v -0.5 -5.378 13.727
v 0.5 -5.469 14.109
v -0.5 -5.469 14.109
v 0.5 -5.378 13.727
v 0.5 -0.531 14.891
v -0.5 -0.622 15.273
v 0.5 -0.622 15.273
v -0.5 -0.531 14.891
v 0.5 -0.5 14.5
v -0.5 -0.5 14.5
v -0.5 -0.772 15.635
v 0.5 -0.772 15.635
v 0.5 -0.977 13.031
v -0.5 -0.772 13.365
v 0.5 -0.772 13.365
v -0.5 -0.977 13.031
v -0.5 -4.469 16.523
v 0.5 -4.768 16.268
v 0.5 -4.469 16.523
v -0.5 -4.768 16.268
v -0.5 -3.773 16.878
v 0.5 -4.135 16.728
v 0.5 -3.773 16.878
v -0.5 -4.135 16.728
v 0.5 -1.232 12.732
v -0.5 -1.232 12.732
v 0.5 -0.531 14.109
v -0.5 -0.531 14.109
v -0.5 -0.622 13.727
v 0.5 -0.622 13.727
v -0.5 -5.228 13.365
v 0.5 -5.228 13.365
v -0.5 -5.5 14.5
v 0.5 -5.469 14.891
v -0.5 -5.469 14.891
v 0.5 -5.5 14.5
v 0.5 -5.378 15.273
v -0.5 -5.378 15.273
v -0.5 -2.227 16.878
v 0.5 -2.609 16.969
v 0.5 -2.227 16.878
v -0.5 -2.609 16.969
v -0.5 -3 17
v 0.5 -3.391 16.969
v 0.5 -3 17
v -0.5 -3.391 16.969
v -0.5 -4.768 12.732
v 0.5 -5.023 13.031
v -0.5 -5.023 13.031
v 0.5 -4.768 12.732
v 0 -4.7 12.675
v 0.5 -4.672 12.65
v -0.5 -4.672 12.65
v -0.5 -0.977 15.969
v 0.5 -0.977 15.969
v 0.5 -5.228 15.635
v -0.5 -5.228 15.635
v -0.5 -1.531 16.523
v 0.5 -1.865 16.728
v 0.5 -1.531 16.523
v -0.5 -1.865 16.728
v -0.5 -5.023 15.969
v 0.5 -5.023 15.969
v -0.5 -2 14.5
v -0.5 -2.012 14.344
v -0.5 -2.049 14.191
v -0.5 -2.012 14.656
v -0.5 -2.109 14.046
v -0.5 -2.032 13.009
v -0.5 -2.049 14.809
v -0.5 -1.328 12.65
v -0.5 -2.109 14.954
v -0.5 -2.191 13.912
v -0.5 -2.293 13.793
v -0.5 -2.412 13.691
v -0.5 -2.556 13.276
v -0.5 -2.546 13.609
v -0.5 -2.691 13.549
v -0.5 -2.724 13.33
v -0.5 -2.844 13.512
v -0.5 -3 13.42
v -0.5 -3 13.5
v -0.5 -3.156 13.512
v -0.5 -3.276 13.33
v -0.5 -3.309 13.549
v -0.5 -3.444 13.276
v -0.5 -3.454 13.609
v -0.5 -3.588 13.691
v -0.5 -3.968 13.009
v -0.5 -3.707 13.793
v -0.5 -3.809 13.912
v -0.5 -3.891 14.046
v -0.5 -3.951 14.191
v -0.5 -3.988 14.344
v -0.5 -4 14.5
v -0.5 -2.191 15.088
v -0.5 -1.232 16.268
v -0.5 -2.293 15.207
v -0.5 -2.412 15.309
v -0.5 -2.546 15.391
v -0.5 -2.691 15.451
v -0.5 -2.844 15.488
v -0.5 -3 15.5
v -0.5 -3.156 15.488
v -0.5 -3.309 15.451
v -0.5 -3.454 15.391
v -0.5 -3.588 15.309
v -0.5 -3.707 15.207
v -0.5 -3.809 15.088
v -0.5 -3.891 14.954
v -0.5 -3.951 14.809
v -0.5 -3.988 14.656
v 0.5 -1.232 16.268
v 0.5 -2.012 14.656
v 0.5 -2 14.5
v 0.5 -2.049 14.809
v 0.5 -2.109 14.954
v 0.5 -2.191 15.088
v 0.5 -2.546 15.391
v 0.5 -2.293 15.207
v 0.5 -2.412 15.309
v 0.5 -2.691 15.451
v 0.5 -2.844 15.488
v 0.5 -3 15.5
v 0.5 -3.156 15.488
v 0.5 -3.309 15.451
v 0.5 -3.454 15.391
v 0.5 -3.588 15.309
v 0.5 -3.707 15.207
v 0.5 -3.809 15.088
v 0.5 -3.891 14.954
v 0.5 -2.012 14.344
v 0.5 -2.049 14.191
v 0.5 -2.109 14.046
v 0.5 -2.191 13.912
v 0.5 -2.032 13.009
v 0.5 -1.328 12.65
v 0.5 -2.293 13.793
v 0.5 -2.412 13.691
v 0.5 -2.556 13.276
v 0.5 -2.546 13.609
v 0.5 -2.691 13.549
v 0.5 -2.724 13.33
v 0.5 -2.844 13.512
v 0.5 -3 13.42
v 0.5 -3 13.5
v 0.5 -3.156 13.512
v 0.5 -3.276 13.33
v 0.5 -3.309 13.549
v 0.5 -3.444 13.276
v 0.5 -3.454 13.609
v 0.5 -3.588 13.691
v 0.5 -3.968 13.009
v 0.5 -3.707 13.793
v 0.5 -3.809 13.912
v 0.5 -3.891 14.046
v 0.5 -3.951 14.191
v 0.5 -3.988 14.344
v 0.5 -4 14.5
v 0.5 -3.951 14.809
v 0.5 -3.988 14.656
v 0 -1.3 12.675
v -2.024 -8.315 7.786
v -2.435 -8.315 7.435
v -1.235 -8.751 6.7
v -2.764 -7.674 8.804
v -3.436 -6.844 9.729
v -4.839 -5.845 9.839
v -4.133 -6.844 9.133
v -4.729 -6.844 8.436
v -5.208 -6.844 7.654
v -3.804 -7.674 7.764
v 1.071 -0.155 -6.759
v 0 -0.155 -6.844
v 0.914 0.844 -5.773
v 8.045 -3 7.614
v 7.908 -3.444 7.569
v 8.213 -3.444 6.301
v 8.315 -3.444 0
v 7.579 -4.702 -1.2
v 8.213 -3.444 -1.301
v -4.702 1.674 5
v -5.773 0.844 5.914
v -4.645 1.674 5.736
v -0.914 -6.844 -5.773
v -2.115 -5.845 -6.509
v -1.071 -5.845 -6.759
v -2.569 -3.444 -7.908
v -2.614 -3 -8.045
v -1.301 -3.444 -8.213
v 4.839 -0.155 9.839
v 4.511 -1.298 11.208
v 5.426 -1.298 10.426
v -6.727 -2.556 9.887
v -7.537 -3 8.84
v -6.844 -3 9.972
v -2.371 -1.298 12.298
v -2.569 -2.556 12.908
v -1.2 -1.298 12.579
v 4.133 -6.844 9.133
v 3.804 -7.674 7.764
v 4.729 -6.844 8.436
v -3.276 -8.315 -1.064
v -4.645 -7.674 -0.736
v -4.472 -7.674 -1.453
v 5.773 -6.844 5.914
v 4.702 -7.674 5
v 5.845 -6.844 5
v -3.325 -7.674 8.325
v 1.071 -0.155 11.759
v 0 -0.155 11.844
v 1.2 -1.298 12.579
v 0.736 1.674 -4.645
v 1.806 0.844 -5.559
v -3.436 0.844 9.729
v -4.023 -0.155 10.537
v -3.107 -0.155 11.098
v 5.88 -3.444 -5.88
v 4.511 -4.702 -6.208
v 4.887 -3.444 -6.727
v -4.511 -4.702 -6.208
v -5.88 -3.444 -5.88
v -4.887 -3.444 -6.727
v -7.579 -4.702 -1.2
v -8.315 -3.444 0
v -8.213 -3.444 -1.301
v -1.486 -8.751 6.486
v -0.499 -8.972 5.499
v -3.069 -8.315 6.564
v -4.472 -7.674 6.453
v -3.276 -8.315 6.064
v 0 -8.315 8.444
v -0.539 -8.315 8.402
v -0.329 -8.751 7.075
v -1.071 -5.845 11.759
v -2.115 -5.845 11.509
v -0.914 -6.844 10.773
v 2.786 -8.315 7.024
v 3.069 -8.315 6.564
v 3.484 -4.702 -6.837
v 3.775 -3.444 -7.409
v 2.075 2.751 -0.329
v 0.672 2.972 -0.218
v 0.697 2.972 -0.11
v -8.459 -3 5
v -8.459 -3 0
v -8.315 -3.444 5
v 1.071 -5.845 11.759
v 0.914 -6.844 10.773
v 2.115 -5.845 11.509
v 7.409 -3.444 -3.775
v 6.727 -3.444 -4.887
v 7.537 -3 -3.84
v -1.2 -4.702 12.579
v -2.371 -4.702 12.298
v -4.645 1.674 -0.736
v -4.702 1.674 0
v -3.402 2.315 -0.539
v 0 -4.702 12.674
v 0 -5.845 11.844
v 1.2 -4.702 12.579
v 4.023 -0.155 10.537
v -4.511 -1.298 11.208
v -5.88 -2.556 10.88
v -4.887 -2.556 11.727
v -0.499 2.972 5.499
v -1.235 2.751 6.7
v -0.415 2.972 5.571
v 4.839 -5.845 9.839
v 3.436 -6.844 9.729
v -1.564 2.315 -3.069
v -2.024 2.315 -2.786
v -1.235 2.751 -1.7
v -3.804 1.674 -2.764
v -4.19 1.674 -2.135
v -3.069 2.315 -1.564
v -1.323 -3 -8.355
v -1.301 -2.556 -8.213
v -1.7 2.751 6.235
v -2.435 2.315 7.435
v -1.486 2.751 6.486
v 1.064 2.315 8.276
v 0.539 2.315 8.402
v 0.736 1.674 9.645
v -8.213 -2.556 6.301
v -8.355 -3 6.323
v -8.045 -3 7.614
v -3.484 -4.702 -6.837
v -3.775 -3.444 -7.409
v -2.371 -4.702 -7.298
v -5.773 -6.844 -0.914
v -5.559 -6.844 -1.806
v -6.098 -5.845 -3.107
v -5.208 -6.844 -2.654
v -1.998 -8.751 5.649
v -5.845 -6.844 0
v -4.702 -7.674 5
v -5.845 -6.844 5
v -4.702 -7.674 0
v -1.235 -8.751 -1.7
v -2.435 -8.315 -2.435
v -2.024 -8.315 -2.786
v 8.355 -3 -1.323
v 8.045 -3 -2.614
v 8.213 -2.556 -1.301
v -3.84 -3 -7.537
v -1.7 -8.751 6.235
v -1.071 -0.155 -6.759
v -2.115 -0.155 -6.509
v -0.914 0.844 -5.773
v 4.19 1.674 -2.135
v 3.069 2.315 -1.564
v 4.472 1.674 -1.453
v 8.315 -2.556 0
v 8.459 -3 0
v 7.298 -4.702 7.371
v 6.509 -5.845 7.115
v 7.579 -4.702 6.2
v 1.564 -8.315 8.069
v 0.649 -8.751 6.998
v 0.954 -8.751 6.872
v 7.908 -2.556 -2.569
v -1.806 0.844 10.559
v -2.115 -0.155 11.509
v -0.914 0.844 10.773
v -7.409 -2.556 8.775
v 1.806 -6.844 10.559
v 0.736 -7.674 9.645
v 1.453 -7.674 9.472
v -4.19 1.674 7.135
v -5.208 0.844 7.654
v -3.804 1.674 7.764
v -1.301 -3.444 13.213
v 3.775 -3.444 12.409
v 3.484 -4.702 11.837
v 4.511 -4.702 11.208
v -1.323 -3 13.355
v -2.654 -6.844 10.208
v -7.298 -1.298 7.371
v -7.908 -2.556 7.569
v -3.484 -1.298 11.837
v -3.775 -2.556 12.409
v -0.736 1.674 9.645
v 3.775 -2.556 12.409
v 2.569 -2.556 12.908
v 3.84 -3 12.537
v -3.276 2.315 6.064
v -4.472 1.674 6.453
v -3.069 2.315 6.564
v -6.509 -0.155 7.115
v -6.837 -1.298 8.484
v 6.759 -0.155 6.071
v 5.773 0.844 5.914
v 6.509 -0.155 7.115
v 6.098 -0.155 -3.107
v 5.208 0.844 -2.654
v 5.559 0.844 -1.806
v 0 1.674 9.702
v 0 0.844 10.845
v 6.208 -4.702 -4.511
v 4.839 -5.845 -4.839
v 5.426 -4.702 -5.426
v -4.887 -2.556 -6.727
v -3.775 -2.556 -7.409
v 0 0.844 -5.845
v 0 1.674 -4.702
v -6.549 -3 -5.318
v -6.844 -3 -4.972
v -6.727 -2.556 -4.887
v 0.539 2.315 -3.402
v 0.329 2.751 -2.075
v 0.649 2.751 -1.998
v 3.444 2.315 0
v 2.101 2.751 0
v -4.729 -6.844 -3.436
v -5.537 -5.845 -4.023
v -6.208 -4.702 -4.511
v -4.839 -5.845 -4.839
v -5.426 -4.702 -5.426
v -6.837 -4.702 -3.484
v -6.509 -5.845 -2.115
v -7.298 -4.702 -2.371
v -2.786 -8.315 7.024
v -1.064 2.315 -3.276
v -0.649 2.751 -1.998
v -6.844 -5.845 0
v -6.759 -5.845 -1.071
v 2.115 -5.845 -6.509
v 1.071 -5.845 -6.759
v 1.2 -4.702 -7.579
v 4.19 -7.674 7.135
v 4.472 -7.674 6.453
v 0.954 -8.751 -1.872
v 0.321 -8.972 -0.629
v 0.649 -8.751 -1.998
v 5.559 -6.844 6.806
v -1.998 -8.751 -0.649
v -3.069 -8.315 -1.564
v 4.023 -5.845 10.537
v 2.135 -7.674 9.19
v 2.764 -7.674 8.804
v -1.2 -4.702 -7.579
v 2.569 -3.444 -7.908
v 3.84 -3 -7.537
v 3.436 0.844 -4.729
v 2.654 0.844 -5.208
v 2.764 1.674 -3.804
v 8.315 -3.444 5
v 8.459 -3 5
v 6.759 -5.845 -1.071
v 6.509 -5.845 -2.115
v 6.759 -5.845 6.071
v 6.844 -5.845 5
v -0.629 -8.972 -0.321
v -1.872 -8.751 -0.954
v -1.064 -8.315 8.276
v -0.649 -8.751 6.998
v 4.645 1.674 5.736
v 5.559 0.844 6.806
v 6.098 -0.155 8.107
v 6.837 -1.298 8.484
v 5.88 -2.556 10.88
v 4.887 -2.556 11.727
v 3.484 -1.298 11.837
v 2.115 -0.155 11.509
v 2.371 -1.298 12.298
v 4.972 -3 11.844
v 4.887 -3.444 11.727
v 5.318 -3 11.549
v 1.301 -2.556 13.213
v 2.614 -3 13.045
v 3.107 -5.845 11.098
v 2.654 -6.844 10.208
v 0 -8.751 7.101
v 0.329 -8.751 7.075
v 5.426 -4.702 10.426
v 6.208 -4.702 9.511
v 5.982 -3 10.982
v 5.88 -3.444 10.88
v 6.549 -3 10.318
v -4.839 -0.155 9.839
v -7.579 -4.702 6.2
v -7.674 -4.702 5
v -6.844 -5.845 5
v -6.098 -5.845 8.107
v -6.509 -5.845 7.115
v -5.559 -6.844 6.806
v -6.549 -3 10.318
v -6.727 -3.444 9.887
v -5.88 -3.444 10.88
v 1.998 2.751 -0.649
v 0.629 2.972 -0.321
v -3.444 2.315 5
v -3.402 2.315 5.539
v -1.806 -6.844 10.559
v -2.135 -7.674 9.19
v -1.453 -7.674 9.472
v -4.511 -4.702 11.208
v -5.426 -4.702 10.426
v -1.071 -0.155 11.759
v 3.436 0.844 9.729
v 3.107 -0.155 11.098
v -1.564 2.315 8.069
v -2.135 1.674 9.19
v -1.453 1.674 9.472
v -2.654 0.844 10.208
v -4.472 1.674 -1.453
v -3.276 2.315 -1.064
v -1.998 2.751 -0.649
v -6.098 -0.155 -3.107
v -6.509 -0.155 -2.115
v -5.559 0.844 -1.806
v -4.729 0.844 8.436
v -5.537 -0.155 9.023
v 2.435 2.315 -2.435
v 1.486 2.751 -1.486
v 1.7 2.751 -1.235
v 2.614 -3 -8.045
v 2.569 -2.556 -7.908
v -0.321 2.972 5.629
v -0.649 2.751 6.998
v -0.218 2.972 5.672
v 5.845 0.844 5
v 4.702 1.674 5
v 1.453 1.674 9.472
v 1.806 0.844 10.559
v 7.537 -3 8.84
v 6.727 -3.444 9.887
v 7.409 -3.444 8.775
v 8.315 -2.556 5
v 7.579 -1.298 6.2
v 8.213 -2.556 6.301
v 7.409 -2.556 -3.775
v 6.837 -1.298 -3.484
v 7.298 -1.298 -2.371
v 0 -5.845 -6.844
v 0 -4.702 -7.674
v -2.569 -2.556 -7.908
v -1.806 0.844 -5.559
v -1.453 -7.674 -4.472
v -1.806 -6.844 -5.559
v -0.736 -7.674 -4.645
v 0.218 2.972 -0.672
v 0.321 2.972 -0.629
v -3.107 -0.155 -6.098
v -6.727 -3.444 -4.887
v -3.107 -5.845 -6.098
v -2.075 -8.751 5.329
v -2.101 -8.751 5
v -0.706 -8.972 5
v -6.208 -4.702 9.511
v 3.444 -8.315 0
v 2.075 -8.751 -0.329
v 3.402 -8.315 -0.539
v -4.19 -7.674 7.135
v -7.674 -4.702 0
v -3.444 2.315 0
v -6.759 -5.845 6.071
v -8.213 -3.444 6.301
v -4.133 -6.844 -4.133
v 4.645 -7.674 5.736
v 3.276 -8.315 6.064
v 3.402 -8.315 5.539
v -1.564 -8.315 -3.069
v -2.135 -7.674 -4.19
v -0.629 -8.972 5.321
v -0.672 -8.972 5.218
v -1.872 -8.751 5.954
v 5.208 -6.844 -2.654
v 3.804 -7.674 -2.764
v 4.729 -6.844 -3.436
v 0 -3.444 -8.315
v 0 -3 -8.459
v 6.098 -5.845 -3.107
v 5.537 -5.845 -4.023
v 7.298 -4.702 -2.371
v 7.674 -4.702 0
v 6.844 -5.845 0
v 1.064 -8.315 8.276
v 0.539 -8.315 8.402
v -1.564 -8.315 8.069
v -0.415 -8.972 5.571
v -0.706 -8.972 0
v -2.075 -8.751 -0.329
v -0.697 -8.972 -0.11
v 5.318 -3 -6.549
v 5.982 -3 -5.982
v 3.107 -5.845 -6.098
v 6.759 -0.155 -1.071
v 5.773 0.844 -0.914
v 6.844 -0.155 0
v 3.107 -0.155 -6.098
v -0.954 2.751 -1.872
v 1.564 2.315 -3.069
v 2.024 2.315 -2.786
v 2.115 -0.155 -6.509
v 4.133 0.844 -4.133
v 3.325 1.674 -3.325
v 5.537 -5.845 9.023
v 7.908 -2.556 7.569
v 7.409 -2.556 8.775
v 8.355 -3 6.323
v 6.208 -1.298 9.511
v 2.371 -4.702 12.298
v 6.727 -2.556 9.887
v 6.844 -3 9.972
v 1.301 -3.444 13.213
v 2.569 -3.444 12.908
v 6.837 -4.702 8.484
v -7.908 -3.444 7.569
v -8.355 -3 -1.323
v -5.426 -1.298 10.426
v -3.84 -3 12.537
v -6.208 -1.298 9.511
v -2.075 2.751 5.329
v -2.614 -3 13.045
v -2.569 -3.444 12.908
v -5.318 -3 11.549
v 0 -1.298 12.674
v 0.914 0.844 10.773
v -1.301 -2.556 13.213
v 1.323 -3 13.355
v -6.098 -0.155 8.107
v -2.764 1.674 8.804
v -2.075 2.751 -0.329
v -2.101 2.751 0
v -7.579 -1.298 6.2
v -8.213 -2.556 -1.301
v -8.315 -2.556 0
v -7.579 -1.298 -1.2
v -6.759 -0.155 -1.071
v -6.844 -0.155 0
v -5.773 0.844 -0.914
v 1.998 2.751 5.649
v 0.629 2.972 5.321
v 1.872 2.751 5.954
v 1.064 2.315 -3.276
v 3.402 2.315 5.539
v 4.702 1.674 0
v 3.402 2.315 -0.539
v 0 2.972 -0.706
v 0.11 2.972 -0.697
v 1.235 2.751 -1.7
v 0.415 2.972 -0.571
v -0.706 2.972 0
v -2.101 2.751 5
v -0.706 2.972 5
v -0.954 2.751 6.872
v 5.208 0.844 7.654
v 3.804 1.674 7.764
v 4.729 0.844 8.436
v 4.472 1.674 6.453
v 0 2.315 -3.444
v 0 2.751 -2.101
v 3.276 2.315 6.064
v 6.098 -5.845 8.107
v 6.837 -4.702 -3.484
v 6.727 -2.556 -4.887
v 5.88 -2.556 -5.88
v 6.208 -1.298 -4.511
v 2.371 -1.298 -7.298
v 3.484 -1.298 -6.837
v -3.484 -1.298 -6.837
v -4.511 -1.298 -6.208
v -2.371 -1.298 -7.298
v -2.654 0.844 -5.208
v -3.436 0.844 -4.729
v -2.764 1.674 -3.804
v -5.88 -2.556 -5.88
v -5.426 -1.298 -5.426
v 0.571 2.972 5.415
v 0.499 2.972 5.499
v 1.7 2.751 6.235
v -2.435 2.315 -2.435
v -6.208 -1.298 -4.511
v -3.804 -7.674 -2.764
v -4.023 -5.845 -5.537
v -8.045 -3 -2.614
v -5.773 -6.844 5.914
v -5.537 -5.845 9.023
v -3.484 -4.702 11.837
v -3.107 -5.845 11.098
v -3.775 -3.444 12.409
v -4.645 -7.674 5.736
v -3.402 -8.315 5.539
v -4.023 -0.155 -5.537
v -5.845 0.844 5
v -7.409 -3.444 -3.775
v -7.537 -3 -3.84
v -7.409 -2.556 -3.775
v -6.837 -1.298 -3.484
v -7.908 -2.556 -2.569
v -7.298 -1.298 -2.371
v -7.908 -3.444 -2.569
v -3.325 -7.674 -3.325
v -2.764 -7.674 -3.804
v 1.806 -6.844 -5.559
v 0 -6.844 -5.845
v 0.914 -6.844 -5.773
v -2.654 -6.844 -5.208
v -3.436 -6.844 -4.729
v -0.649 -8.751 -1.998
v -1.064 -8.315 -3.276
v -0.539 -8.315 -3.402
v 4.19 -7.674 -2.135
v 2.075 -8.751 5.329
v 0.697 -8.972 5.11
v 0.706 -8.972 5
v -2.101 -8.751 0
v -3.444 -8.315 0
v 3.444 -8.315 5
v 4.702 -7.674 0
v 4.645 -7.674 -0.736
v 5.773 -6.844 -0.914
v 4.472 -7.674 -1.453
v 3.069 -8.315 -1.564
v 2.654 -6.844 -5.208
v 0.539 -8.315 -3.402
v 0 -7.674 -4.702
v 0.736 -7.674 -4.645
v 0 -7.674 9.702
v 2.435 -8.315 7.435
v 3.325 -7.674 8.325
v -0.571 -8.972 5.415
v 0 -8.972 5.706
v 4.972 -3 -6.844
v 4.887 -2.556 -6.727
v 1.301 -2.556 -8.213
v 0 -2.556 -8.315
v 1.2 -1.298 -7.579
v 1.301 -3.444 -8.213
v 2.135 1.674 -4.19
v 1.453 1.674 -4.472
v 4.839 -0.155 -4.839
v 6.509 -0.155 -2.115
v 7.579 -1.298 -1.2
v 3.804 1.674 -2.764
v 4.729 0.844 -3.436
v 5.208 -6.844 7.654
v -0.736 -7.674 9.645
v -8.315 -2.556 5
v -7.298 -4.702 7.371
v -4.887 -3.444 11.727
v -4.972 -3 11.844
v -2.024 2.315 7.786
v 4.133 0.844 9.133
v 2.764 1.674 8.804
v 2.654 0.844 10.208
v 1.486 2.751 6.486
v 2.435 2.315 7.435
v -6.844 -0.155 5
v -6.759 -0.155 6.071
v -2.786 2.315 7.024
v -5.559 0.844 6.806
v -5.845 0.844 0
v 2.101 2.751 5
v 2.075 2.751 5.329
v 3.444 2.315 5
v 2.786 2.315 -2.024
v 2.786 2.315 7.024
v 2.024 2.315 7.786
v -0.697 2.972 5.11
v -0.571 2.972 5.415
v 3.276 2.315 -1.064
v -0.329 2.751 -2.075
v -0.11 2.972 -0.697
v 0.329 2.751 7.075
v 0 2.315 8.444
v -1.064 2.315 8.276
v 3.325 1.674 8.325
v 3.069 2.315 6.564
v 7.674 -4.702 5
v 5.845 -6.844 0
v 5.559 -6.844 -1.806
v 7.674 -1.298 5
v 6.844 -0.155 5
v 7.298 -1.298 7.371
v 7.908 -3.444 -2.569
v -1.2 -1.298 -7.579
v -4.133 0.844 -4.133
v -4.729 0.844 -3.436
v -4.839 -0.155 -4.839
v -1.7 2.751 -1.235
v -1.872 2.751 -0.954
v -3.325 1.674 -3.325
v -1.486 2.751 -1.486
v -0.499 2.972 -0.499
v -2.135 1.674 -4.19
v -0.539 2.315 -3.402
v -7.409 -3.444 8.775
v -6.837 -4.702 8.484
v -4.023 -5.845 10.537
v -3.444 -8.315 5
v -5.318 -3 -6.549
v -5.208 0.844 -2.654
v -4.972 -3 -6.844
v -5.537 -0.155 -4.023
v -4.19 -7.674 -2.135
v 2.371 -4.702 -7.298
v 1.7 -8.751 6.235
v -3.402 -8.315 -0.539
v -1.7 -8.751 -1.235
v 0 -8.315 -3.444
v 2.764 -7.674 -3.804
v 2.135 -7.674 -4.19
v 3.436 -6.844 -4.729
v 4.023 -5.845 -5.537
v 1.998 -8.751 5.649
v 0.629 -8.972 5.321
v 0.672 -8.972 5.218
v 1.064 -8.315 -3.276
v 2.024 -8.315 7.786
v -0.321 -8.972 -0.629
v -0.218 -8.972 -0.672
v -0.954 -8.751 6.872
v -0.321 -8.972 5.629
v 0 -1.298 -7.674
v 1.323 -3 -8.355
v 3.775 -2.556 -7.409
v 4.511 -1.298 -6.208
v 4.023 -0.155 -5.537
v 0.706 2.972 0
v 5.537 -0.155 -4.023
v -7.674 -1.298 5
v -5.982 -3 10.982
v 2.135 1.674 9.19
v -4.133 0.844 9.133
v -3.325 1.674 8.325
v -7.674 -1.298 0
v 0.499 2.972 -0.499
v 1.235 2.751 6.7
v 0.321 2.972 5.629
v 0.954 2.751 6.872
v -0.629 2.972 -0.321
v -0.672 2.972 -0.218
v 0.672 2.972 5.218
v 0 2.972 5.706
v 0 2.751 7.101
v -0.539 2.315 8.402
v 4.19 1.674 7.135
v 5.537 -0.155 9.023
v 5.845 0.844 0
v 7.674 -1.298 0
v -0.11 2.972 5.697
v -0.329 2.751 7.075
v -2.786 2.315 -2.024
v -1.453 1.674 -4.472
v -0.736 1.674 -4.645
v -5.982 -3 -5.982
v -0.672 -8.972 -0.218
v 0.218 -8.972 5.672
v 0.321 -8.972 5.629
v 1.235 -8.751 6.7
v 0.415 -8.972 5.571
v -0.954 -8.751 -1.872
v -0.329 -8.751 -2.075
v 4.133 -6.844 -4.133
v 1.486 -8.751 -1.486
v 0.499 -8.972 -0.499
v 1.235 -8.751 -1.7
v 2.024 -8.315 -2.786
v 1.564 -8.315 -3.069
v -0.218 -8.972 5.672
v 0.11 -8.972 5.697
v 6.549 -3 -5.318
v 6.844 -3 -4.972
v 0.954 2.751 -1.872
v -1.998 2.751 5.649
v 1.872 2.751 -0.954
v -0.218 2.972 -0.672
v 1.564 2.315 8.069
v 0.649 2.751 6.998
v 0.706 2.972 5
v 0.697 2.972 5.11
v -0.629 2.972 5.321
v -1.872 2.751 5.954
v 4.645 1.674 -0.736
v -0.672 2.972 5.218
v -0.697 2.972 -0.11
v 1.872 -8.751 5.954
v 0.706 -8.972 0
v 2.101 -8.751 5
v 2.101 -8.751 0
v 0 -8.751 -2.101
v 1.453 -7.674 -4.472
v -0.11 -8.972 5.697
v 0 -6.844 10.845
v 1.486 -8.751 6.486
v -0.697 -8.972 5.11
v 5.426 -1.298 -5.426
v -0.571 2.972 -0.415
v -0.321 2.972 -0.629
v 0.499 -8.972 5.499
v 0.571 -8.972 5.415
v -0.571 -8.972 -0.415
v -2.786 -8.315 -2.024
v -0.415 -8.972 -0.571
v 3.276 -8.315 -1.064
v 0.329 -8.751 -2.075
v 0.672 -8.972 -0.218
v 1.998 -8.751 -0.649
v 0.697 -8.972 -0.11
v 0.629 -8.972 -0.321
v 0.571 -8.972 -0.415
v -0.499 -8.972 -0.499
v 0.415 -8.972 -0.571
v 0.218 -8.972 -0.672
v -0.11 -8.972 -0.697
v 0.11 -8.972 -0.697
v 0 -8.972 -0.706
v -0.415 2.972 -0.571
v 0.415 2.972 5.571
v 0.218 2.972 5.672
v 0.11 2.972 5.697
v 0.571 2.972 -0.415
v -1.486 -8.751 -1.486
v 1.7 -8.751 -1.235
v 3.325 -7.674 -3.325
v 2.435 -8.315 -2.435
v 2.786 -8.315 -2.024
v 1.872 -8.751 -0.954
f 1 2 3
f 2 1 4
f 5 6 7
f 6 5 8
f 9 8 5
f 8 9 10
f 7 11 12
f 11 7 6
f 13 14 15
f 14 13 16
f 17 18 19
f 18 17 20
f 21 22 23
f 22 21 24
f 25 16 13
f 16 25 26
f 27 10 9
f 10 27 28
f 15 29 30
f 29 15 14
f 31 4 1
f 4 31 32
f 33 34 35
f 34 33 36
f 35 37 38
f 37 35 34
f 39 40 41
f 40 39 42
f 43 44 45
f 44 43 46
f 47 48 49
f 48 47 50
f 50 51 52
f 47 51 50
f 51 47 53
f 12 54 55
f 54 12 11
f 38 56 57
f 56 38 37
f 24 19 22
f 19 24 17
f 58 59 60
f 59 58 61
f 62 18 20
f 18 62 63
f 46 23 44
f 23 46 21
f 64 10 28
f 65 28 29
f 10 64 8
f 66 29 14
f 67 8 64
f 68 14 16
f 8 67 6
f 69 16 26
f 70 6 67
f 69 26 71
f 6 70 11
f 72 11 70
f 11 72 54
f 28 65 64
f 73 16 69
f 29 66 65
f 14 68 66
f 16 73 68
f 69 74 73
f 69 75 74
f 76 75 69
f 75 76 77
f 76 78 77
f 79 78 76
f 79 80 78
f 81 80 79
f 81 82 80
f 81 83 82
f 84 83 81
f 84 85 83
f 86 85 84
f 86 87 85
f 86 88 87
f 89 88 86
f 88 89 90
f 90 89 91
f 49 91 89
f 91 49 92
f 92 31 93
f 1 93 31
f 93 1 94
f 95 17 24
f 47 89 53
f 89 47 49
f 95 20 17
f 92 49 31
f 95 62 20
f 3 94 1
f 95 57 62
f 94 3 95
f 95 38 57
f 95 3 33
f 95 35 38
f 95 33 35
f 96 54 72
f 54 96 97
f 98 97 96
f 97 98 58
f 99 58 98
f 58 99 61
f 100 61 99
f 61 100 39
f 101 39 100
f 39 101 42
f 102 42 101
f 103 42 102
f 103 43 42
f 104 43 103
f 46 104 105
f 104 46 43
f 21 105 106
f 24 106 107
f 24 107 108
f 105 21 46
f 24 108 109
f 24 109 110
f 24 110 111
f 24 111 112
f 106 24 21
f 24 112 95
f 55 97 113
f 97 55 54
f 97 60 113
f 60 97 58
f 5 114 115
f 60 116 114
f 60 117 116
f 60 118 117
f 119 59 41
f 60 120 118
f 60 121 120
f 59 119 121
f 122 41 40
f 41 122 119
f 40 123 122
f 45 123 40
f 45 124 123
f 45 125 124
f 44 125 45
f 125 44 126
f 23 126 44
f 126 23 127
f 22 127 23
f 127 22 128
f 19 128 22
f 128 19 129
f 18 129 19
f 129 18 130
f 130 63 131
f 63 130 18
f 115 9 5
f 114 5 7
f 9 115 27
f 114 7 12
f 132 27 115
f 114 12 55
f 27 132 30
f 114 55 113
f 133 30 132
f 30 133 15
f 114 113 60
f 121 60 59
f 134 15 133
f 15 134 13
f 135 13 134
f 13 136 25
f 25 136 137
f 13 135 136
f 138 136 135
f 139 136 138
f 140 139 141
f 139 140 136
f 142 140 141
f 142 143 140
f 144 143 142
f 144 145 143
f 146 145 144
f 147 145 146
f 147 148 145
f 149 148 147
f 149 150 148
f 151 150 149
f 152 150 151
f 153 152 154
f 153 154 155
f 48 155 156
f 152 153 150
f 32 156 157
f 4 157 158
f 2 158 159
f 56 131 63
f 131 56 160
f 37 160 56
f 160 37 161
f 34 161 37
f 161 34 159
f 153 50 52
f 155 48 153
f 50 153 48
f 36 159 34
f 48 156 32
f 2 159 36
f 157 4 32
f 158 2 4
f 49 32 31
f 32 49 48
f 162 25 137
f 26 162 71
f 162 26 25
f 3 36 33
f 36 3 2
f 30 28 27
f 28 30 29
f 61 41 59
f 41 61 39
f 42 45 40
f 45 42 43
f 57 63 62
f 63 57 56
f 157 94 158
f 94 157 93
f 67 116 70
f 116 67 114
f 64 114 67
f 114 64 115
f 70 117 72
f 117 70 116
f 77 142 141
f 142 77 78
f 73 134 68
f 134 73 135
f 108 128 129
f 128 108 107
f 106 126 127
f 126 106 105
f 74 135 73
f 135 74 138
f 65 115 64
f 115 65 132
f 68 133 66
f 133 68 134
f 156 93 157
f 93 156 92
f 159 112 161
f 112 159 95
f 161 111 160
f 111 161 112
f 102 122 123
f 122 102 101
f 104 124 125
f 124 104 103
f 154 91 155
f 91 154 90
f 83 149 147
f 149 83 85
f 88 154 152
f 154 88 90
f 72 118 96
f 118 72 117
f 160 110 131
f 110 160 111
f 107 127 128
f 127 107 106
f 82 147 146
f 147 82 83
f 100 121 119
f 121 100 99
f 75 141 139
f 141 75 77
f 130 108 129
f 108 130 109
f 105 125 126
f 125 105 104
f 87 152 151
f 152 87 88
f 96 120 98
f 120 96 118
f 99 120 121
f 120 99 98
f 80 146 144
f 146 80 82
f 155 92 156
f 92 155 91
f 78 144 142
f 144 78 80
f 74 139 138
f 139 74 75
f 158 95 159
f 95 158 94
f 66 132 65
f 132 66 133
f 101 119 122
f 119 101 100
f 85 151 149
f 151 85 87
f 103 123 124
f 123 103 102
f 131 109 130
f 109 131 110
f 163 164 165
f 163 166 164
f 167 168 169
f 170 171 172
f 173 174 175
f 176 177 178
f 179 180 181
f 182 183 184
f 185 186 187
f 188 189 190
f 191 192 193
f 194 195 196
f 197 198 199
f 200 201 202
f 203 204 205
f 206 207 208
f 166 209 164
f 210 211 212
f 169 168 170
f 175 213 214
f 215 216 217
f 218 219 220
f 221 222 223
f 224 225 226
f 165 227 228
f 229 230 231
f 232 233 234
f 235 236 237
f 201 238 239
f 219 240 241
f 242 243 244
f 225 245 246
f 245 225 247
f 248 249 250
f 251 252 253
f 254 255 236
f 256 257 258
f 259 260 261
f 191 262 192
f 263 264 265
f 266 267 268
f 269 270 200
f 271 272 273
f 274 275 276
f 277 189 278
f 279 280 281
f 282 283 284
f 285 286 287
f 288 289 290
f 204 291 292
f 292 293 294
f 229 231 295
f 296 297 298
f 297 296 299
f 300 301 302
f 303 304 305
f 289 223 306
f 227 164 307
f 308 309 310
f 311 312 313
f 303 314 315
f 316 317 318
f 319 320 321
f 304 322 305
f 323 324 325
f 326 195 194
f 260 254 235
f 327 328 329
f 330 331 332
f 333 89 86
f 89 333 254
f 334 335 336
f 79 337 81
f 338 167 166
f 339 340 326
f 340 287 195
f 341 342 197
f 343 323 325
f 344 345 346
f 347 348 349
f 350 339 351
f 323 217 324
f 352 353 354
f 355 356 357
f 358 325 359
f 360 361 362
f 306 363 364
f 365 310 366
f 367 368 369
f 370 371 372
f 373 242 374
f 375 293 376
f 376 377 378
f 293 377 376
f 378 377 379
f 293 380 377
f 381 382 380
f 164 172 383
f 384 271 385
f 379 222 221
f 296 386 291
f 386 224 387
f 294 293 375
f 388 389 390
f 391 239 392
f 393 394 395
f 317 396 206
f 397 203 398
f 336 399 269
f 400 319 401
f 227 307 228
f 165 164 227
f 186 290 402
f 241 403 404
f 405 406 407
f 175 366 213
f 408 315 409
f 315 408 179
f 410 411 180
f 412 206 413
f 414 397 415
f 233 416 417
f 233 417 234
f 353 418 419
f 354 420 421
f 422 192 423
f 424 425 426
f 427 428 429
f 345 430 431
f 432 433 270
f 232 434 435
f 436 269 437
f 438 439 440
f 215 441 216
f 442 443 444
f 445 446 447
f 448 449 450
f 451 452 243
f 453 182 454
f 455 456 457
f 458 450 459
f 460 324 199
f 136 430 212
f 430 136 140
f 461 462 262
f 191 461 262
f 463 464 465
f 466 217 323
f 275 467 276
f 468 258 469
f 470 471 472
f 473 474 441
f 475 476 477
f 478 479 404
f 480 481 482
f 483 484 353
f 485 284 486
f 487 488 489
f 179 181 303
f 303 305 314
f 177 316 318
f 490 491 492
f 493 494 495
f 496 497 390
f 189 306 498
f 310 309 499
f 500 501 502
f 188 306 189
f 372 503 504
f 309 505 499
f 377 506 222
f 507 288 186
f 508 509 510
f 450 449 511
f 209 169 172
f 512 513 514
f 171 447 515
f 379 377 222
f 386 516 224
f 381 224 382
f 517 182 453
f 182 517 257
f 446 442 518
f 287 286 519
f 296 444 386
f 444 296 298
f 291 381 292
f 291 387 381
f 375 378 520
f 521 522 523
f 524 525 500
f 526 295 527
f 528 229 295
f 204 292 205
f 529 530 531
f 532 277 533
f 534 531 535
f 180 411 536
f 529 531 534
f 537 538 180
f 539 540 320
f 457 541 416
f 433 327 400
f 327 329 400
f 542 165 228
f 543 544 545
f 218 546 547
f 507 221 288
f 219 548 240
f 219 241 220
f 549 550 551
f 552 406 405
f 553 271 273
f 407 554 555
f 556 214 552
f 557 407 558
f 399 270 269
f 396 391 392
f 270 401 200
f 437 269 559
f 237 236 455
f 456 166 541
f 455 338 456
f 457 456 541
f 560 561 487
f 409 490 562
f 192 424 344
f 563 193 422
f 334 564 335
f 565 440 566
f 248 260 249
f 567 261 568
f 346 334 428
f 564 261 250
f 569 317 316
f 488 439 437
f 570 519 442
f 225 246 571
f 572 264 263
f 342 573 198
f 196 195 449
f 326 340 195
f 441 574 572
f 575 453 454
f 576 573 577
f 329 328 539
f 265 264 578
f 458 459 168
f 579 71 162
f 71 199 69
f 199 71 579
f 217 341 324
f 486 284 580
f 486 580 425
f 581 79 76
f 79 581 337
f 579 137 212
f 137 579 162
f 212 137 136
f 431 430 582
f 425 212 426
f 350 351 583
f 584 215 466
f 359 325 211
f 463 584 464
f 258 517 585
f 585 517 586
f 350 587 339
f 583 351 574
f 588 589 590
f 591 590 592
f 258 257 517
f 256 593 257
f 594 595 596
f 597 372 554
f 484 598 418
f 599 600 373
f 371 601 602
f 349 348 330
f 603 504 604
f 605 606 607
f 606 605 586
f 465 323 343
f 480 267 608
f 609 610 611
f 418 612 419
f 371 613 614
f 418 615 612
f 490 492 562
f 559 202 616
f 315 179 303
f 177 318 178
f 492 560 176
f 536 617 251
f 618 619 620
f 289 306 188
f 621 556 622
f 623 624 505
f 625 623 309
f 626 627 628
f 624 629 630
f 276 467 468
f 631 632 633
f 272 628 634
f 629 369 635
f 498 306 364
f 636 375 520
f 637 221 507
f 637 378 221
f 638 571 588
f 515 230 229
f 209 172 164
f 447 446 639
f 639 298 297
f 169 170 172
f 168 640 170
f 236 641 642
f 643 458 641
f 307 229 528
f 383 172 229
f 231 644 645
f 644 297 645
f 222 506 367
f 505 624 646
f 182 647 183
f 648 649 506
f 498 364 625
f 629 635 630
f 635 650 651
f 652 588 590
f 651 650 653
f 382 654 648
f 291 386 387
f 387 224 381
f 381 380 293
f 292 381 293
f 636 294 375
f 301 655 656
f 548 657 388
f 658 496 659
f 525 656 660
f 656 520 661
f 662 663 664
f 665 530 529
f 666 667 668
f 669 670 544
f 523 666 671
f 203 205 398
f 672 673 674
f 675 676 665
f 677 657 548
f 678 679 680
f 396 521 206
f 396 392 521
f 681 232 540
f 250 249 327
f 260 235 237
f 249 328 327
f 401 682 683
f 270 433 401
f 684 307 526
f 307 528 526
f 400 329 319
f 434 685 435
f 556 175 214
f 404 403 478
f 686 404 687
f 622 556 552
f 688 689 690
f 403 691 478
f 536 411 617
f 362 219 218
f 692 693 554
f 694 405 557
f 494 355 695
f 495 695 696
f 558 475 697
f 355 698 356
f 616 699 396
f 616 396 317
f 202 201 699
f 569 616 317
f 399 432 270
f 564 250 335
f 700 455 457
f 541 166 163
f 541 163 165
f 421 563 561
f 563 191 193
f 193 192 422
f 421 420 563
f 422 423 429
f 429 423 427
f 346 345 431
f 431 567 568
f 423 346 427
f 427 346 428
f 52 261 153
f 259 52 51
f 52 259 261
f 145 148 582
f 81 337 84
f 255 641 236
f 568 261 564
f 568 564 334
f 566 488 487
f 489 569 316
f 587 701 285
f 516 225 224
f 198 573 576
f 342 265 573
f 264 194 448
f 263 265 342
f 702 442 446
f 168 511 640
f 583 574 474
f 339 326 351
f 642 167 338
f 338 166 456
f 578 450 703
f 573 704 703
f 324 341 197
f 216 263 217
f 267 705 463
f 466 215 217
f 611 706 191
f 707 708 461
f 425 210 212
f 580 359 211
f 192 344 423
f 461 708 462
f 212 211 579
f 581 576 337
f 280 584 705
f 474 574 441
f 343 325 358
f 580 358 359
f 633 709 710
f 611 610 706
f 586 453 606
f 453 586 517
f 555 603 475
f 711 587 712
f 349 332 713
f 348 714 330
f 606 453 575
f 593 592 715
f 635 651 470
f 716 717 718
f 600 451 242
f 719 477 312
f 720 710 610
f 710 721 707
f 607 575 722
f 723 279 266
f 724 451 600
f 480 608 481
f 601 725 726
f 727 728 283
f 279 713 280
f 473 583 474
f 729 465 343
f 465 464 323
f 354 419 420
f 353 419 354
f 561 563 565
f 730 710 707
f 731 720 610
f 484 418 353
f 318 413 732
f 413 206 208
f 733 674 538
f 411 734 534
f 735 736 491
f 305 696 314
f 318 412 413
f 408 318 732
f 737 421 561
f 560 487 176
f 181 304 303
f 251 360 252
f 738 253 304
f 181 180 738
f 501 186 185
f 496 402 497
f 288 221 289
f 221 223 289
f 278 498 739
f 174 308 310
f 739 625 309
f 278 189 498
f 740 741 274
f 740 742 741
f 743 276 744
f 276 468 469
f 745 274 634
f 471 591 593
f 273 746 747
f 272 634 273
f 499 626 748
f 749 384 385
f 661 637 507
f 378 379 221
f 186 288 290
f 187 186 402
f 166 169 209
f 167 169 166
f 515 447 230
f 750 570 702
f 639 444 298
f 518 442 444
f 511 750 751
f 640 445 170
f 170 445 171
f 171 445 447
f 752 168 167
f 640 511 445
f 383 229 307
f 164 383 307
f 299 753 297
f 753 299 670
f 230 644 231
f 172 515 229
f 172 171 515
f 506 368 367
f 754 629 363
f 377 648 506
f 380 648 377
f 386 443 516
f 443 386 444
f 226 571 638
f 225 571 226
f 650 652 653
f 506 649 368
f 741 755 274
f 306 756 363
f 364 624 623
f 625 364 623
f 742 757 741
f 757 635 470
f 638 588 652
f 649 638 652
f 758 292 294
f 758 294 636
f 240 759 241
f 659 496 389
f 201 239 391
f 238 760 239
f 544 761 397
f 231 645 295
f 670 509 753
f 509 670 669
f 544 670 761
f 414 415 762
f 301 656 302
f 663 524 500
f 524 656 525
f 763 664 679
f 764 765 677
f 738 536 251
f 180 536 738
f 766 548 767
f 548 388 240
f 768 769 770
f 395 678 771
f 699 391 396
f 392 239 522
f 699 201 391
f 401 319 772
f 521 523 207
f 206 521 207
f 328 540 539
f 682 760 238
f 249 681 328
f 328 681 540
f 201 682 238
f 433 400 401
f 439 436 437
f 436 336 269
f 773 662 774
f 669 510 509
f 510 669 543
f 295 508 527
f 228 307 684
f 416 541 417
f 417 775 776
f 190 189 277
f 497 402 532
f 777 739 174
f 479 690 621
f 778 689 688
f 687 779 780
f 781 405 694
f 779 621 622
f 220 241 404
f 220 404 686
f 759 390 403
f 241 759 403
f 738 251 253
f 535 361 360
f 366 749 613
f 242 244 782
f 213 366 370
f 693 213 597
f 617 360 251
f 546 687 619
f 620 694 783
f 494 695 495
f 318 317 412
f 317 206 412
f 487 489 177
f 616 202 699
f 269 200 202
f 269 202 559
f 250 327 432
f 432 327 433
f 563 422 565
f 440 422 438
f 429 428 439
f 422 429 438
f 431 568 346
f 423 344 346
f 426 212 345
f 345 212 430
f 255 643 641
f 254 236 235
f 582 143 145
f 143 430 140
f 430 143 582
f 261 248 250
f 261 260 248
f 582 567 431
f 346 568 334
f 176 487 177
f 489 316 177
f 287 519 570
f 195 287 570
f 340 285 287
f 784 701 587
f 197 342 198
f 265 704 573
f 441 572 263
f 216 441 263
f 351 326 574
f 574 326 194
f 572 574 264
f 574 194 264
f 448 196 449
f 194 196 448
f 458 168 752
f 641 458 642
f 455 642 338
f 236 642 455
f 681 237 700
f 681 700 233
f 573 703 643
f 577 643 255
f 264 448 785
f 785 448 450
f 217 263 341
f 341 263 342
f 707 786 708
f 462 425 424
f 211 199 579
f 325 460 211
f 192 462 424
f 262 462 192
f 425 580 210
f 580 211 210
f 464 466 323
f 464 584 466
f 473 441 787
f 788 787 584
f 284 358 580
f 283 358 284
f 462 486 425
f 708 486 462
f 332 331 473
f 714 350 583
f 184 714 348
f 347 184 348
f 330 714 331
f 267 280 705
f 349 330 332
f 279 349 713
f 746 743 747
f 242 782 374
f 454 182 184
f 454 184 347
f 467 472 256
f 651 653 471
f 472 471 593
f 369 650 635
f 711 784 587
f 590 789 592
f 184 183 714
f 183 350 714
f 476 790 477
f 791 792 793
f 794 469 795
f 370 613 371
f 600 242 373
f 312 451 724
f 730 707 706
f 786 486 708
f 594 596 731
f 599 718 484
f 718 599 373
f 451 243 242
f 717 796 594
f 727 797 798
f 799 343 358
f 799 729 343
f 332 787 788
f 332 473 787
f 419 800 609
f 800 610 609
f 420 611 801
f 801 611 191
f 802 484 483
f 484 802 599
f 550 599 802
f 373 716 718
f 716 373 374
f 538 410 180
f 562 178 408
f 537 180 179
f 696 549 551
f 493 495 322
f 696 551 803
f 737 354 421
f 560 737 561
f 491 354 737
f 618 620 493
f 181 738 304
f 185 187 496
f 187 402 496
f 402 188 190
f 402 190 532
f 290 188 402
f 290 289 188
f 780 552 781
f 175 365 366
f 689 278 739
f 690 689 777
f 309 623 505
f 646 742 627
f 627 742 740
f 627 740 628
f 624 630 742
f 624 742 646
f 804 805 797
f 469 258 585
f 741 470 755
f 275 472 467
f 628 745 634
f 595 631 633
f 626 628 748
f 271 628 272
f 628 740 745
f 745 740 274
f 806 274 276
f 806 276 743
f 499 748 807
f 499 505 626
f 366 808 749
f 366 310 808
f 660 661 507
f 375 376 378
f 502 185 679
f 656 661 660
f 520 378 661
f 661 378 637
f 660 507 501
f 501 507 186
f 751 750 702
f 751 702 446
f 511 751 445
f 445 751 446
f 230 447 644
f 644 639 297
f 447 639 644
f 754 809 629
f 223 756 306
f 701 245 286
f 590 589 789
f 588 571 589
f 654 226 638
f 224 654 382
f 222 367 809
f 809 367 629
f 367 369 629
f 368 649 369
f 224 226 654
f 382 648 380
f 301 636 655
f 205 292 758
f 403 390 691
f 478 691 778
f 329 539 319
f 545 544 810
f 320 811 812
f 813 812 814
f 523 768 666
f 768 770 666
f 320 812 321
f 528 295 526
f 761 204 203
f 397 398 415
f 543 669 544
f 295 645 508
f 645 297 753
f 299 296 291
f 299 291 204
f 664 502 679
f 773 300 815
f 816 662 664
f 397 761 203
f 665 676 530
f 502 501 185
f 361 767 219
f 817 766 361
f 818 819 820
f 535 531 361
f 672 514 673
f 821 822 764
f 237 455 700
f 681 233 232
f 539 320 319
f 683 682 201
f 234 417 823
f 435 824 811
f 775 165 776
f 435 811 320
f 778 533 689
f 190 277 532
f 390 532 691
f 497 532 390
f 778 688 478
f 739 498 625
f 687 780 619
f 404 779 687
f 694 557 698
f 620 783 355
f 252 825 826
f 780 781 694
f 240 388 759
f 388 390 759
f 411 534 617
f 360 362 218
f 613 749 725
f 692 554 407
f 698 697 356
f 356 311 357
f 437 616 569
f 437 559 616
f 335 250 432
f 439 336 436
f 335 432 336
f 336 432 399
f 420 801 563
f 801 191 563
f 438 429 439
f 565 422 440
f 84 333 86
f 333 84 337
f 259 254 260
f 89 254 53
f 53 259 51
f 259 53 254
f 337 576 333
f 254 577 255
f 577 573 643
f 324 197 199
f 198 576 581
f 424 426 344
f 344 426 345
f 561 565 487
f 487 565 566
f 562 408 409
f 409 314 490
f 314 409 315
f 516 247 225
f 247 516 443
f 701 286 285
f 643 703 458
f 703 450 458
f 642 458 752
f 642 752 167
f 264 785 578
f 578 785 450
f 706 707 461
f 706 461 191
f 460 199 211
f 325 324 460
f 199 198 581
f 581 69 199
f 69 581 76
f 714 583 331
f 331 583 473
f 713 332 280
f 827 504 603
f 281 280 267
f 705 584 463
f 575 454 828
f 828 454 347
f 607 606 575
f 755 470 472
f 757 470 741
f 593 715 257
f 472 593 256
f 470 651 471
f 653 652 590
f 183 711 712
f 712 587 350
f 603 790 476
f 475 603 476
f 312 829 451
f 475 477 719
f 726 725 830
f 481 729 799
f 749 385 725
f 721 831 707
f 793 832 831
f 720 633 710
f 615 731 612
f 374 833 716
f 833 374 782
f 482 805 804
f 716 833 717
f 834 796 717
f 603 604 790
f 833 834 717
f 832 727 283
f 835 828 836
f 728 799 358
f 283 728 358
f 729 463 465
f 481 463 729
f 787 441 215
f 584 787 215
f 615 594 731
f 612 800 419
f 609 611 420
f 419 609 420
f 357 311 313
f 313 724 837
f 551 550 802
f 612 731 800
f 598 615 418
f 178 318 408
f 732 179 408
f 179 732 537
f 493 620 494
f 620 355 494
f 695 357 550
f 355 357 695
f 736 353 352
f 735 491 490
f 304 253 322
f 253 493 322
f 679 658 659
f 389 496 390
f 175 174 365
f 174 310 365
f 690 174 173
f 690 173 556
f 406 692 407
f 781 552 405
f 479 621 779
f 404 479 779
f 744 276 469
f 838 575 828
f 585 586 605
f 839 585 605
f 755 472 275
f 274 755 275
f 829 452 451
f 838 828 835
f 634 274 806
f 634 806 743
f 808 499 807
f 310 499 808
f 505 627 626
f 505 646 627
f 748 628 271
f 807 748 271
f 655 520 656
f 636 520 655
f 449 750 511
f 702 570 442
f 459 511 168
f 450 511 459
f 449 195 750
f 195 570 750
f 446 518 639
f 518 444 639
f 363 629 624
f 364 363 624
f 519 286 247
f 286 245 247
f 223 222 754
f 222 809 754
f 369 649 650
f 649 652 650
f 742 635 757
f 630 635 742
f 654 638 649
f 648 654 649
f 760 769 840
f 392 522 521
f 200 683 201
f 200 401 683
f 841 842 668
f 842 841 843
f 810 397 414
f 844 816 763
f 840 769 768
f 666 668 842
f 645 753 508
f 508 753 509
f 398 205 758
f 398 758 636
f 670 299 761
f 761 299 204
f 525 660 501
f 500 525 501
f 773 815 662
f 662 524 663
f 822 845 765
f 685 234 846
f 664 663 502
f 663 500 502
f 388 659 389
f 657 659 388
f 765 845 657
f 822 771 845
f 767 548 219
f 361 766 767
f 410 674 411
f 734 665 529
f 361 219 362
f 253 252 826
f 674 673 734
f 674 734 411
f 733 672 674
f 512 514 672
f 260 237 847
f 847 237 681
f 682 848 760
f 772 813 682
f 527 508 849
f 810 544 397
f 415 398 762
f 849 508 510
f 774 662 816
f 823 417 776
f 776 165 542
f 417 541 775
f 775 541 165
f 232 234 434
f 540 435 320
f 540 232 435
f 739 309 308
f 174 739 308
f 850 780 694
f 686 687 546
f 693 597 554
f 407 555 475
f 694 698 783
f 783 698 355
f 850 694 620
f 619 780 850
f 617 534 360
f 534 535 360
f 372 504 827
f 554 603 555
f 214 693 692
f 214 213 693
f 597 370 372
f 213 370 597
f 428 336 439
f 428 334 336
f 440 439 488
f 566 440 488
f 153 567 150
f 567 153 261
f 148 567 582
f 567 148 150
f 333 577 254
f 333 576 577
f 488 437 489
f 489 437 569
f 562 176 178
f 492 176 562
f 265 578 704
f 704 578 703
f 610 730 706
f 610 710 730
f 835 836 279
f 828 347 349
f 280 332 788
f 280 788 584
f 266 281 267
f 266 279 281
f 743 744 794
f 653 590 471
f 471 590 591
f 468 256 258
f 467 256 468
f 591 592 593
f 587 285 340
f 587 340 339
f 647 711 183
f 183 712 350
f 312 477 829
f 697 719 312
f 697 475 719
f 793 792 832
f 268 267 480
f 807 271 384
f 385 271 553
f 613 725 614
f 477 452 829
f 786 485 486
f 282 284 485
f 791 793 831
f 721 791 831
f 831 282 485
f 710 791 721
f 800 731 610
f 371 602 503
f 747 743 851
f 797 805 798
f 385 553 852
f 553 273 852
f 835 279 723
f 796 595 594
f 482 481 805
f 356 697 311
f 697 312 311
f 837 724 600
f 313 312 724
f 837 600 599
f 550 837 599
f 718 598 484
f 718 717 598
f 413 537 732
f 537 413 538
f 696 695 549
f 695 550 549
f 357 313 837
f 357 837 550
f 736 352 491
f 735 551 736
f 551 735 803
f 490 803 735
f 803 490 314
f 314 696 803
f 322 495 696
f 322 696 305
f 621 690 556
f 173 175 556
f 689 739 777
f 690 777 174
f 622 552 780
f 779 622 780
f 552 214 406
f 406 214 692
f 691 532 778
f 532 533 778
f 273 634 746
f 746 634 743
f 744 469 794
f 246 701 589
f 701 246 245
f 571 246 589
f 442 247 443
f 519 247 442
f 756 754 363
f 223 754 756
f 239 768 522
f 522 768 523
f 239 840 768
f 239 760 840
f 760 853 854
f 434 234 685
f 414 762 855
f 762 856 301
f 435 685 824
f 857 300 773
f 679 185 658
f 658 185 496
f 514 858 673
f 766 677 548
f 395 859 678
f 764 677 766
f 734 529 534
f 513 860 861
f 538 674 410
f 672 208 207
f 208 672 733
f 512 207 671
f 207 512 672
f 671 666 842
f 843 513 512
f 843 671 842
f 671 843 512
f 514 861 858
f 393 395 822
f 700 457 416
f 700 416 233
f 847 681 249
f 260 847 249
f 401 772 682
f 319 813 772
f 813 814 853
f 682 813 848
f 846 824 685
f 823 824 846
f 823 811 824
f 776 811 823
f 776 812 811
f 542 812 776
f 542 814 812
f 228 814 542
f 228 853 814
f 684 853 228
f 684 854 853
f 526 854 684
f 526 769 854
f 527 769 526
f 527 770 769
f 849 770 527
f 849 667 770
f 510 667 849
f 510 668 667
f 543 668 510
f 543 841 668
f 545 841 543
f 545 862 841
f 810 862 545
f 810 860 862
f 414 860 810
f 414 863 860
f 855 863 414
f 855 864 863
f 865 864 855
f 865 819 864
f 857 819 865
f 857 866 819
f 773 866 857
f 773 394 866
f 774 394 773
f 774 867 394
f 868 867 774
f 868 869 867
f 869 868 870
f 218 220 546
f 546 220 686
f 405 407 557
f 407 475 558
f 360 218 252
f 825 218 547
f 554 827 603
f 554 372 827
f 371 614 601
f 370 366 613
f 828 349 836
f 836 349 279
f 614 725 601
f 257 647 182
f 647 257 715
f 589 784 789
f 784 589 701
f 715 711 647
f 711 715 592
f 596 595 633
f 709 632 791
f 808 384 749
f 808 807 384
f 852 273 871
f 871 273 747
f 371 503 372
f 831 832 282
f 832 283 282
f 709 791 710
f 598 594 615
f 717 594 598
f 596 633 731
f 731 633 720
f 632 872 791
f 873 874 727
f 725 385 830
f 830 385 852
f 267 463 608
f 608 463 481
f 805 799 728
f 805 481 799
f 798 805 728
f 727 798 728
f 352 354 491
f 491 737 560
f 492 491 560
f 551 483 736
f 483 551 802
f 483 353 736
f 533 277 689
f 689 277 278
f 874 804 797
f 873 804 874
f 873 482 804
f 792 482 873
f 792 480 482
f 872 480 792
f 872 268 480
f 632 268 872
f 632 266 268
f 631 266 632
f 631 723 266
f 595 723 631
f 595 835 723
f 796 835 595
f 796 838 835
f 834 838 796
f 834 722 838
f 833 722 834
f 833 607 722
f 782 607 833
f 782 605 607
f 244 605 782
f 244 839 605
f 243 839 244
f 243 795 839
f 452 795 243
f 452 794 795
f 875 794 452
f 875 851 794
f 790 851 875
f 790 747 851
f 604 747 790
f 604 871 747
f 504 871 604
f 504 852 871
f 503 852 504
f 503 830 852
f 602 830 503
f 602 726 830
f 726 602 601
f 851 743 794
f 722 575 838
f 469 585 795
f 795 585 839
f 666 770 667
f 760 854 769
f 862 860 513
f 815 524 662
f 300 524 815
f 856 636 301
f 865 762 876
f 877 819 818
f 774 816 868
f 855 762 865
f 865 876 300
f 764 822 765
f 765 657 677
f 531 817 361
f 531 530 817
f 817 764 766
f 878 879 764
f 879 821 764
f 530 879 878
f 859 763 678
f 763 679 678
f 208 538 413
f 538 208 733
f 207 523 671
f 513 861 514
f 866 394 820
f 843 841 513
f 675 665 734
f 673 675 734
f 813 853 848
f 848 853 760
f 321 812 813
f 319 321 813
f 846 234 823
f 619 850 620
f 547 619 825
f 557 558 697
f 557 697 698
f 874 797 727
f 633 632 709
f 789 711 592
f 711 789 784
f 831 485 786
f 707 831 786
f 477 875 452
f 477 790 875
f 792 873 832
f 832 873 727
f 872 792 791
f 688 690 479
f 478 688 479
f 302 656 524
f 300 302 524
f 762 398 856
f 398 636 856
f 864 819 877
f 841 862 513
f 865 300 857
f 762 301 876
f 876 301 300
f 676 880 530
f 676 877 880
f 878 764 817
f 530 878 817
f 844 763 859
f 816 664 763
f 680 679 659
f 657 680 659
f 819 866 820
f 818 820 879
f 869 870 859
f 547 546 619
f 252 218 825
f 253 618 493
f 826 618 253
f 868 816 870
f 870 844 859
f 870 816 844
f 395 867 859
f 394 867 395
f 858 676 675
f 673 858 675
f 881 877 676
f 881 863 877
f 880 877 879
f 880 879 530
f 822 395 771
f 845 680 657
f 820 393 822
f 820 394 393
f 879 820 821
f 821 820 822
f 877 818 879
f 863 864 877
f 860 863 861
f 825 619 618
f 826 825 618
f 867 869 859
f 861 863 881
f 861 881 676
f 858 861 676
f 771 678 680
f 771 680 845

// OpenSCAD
$fn=40;

rotate([90,0,0]) union() {
	hull() {
		intersection() {
			sphere(9);
			translate([0,0,6]) sphere(9);
		} 
		translate([0,5,0]) intersection() {
			sphere(9);
			translate([0,0,6]) sphere(9);
		}
	}
	translate([0,14.5,3]) rotate([0,90,0])
	difference() {
		cylinder (h = 1, r = 2.5, center = true); 
		cylinder (h = 1, r = 1, center = true);
	}
}
